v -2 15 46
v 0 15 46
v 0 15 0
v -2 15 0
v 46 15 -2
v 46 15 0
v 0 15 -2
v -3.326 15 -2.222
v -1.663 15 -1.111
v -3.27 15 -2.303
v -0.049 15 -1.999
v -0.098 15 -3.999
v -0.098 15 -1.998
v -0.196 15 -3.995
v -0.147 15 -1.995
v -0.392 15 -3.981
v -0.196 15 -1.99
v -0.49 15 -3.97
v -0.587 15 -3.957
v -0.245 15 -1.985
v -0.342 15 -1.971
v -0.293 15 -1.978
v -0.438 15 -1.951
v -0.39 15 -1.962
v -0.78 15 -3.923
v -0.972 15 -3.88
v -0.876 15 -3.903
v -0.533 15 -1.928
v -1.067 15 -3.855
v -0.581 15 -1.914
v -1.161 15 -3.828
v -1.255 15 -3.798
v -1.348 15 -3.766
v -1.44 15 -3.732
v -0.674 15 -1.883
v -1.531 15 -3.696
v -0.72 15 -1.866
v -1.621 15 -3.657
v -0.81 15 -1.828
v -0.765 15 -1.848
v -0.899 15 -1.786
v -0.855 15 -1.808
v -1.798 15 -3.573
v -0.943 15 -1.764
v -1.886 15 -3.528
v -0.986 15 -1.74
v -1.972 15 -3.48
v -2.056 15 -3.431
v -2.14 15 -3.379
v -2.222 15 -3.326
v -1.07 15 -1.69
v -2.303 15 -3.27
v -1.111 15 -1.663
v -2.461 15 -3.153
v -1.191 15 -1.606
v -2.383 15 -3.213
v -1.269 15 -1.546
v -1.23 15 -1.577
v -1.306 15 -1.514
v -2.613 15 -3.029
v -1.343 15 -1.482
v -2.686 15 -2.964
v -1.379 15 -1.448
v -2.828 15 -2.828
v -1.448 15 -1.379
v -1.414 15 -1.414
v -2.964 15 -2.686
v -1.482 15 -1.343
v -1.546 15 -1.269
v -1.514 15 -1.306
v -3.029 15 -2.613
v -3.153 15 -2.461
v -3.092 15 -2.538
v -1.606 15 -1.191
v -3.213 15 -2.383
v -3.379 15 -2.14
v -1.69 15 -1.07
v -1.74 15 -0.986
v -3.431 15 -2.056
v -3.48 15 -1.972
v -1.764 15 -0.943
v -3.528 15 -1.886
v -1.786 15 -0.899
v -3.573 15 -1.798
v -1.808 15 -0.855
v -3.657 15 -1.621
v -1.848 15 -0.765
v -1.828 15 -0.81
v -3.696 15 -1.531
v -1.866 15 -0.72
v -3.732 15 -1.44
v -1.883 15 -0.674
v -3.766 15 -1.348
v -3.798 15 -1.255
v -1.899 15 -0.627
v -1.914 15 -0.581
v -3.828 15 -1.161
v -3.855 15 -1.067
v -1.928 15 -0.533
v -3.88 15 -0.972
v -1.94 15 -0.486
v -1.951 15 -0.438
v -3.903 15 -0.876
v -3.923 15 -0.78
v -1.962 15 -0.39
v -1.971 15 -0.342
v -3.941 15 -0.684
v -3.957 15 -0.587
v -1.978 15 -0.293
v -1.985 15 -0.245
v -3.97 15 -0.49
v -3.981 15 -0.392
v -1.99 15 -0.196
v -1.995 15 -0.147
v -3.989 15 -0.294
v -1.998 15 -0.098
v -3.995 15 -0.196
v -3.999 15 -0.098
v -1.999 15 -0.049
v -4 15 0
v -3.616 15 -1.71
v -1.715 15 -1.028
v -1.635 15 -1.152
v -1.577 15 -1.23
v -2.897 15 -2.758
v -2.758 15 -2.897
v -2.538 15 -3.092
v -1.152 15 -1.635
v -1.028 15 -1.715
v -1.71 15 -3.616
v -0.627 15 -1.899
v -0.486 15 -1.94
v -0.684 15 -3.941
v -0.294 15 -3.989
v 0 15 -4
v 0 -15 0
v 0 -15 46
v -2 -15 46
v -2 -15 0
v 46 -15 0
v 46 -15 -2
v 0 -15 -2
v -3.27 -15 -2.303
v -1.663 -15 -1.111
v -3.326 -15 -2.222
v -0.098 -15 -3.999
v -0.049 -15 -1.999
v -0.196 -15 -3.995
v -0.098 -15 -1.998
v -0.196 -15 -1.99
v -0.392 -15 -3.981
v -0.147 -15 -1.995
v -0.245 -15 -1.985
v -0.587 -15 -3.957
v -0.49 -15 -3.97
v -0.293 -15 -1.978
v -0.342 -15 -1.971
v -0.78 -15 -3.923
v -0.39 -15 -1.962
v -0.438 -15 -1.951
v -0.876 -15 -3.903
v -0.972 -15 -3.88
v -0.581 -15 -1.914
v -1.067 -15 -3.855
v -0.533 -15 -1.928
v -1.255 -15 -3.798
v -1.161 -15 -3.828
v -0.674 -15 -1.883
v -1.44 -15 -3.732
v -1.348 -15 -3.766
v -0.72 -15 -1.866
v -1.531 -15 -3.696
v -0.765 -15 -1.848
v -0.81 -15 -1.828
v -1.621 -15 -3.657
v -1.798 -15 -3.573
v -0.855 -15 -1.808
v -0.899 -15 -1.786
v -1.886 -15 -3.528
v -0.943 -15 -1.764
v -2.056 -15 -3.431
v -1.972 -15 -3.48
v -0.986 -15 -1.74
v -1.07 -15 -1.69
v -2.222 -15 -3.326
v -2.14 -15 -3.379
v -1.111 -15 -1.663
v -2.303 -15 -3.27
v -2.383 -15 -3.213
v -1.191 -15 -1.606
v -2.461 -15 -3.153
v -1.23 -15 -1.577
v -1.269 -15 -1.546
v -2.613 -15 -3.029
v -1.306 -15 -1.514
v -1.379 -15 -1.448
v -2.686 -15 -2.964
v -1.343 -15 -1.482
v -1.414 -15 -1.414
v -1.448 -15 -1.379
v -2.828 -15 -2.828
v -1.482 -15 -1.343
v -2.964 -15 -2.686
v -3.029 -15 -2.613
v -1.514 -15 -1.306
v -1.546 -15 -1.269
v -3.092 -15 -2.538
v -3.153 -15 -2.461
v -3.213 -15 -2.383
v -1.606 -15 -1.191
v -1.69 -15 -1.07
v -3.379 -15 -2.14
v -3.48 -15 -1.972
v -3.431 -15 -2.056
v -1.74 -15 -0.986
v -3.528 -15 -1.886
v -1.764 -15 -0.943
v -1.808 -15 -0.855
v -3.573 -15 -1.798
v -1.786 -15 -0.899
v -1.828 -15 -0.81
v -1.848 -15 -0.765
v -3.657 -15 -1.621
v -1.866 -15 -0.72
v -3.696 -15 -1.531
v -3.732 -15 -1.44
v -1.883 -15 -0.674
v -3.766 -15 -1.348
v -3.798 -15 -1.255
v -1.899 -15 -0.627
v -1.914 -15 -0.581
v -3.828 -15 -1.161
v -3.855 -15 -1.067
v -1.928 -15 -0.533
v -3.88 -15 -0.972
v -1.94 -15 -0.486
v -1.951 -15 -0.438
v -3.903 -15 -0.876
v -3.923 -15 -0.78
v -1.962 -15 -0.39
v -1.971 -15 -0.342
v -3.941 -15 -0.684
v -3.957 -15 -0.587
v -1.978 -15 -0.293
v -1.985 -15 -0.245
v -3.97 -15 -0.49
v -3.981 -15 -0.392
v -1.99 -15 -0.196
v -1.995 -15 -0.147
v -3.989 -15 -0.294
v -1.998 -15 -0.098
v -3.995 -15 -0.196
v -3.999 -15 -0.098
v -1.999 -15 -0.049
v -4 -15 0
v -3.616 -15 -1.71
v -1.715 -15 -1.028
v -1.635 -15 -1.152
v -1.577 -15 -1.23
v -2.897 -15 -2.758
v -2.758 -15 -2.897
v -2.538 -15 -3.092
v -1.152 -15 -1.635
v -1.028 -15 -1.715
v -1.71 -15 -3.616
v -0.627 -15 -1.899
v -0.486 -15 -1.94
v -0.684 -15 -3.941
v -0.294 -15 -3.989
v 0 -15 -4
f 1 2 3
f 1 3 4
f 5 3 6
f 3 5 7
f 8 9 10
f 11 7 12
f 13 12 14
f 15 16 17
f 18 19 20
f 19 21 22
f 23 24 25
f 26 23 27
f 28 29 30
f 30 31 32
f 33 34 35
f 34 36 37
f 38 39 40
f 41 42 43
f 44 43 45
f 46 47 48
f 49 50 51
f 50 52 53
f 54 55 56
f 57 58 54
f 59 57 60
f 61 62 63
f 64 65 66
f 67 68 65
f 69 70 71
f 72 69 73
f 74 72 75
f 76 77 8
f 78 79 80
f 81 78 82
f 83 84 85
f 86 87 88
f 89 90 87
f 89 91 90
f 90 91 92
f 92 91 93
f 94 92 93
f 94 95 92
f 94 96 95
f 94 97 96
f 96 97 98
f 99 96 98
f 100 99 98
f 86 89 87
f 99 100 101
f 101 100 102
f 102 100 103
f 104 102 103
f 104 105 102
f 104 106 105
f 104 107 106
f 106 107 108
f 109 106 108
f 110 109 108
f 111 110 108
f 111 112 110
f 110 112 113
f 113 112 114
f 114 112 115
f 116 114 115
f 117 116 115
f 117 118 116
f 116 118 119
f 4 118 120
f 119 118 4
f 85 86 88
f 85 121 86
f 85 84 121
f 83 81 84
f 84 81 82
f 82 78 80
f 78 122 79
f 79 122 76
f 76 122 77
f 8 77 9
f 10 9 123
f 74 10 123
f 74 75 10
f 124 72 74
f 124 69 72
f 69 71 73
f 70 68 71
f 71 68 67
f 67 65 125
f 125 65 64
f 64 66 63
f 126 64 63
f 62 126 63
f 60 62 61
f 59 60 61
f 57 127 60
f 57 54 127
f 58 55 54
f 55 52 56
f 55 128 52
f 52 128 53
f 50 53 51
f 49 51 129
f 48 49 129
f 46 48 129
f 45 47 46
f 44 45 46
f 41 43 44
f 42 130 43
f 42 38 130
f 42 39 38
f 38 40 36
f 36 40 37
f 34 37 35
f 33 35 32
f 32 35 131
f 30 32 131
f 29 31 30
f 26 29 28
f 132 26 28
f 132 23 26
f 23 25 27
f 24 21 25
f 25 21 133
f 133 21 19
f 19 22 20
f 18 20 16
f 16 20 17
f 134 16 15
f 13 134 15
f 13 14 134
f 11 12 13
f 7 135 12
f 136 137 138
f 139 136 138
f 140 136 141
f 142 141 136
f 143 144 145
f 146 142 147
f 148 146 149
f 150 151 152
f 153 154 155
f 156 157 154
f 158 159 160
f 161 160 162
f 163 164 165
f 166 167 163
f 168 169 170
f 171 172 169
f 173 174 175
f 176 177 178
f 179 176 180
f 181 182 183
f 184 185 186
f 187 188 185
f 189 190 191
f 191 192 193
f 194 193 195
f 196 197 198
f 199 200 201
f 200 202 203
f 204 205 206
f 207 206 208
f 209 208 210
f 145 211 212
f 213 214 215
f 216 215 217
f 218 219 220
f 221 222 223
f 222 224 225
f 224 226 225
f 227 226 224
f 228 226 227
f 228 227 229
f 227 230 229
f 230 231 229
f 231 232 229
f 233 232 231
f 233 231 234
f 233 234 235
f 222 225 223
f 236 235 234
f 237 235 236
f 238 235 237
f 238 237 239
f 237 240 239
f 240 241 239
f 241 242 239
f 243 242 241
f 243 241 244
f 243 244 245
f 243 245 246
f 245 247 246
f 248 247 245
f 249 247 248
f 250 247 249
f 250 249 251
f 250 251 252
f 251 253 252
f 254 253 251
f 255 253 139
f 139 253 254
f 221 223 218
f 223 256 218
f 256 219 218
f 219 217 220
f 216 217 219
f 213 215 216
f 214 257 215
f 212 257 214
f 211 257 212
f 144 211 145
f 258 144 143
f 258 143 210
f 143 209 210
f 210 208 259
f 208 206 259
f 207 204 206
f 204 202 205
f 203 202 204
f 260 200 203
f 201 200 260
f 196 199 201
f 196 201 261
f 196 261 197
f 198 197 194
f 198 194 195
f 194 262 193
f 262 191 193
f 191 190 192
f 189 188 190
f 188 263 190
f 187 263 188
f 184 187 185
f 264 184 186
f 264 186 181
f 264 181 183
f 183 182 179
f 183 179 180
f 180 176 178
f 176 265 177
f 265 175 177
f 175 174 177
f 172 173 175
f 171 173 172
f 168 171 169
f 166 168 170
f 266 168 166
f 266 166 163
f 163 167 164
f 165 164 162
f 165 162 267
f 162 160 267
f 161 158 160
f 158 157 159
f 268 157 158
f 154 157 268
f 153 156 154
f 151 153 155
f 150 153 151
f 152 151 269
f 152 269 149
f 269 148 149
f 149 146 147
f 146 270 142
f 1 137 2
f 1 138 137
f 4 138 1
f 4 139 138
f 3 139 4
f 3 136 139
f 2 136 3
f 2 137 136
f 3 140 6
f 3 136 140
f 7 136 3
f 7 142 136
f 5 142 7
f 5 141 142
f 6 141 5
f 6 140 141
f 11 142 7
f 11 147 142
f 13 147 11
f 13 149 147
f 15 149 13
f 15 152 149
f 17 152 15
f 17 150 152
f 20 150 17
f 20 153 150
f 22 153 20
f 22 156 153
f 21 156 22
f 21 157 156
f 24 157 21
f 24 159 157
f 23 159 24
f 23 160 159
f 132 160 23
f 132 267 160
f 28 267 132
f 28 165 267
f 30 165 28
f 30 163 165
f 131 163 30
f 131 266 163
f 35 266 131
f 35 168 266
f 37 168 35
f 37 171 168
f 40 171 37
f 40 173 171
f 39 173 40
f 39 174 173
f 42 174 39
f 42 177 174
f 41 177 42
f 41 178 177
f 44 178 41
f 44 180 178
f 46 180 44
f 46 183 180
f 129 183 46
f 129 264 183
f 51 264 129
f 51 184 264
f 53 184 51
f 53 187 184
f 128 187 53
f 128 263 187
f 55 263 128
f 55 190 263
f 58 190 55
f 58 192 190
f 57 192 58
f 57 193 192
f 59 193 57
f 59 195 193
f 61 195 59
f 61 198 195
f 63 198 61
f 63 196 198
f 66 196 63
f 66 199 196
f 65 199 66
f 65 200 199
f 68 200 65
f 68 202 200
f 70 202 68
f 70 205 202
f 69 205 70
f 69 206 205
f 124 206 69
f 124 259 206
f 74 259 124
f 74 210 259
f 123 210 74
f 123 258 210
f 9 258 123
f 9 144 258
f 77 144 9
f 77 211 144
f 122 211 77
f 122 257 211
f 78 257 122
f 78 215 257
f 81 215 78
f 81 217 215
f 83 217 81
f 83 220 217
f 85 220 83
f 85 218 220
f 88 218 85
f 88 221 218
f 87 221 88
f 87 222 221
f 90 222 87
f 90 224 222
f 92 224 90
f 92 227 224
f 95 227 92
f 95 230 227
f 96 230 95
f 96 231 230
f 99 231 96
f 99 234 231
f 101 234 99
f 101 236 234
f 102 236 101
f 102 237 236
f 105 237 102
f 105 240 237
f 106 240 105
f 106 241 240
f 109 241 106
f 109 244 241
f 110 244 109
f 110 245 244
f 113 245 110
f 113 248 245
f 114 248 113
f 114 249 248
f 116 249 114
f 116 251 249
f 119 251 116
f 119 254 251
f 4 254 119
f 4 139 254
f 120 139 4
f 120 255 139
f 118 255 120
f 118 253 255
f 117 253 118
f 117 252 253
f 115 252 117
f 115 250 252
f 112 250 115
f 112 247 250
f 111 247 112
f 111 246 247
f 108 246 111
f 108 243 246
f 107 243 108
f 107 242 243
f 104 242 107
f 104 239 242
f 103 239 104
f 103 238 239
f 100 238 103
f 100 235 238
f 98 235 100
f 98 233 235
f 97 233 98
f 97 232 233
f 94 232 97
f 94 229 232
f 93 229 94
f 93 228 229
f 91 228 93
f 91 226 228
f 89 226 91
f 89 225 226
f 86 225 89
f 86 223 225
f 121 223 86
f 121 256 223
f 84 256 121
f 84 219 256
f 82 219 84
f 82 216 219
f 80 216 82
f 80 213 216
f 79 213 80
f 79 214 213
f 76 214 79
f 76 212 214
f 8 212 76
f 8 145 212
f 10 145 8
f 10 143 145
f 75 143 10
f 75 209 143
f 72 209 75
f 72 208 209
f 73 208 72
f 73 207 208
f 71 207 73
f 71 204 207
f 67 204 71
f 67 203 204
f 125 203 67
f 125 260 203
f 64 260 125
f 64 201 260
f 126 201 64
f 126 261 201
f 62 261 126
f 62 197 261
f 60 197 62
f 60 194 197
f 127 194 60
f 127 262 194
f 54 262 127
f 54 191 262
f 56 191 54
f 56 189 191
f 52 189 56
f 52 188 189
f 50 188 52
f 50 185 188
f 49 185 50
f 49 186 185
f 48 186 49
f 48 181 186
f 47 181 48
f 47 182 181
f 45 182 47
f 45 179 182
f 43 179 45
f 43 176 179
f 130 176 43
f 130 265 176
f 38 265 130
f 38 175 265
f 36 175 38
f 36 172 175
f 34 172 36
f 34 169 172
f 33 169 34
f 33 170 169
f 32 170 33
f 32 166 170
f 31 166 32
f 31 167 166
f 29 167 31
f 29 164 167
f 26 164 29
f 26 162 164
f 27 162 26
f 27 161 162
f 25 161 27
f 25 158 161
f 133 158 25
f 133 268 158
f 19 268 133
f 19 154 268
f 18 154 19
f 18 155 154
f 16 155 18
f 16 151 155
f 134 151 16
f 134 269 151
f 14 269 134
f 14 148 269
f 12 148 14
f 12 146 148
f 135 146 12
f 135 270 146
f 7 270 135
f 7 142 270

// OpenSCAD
// Units: mm
$fn = 96;

thickness_mm = 2.0;
bend_radius_mm = 2.0;
k_factor = 0.45;
bend_angle_deg = 90;
bend_angle_rad = PI / 2;

flange_a_outside_mm = 50.0;
flange_b_outside_mm = 50.0;
width_mm = 30.0;

outside_radius_mm = bend_radius_mm + thickness_mm;
outside_setback_mm = outside_radius_mm * tan(bend_angle_deg / 2);
bend_allowance_mm = bend_angle_rad * (bend_radius_mm + k_factor * thickness_mm);
bend_deduction_mm = 2 * outside_setback_mm - bend_allowance_mm;
developed_flat_length_mm = flange_a_outside_mm + flange_b_outside_mm - bend_deduction_mm;

straight_a_mm = flange_a_outside_mm - outside_setback_mm;
straight_b_mm = flange_b_outside_mm - outside_setback_mm;

echo(str(
    "MAKERBENCH-SHEETMETAL: {",
    "\"thickness_mm\":", thickness_mm, ",",
    "\"bend_radius_mm\":", bend_radius_mm, ",",
    "\"developed_flat_length_mm\":", developed_flat_length_mm,
    "}"
));

module annular_sector_2d(r_inner, r_outer, a0, a1, steps = 48) {
    points = concat(
        [for (i = [0:steps])
            let(a = a0 + (a1 - a0) * i / steps)
            [r_outer * cos(a), r_outer * sin(a)]
        ],
        [for (i = [steps:-1:0])
            let(a = a0 + (a1 - a0) * i / steps)
            [r_inner * cos(a), r_inner * sin(a)]
        ]
    );
    polygon(points);
}

module l_bracket_cross_section_2d() {
    union() {
        translate([0, -thickness_mm])
            square([straight_a_mm, thickness_mm], center = false);

        translate([-thickness_mm, 0])
            square([thickness_mm, straight_b_mm], center = false);

        annular_sector_2d(
            bend_radius_mm,
            bend_radius_mm + thickness_mm,
            180,
            270,
            64
        );
    }
}

module formed_l_bracket() {
    rotate([90, 0, 0])
        linear_extrude(height = width_mm, center = true, convexity = 10)
            l_bracket_cross_section_2d();
}

formed_l_bracket();
